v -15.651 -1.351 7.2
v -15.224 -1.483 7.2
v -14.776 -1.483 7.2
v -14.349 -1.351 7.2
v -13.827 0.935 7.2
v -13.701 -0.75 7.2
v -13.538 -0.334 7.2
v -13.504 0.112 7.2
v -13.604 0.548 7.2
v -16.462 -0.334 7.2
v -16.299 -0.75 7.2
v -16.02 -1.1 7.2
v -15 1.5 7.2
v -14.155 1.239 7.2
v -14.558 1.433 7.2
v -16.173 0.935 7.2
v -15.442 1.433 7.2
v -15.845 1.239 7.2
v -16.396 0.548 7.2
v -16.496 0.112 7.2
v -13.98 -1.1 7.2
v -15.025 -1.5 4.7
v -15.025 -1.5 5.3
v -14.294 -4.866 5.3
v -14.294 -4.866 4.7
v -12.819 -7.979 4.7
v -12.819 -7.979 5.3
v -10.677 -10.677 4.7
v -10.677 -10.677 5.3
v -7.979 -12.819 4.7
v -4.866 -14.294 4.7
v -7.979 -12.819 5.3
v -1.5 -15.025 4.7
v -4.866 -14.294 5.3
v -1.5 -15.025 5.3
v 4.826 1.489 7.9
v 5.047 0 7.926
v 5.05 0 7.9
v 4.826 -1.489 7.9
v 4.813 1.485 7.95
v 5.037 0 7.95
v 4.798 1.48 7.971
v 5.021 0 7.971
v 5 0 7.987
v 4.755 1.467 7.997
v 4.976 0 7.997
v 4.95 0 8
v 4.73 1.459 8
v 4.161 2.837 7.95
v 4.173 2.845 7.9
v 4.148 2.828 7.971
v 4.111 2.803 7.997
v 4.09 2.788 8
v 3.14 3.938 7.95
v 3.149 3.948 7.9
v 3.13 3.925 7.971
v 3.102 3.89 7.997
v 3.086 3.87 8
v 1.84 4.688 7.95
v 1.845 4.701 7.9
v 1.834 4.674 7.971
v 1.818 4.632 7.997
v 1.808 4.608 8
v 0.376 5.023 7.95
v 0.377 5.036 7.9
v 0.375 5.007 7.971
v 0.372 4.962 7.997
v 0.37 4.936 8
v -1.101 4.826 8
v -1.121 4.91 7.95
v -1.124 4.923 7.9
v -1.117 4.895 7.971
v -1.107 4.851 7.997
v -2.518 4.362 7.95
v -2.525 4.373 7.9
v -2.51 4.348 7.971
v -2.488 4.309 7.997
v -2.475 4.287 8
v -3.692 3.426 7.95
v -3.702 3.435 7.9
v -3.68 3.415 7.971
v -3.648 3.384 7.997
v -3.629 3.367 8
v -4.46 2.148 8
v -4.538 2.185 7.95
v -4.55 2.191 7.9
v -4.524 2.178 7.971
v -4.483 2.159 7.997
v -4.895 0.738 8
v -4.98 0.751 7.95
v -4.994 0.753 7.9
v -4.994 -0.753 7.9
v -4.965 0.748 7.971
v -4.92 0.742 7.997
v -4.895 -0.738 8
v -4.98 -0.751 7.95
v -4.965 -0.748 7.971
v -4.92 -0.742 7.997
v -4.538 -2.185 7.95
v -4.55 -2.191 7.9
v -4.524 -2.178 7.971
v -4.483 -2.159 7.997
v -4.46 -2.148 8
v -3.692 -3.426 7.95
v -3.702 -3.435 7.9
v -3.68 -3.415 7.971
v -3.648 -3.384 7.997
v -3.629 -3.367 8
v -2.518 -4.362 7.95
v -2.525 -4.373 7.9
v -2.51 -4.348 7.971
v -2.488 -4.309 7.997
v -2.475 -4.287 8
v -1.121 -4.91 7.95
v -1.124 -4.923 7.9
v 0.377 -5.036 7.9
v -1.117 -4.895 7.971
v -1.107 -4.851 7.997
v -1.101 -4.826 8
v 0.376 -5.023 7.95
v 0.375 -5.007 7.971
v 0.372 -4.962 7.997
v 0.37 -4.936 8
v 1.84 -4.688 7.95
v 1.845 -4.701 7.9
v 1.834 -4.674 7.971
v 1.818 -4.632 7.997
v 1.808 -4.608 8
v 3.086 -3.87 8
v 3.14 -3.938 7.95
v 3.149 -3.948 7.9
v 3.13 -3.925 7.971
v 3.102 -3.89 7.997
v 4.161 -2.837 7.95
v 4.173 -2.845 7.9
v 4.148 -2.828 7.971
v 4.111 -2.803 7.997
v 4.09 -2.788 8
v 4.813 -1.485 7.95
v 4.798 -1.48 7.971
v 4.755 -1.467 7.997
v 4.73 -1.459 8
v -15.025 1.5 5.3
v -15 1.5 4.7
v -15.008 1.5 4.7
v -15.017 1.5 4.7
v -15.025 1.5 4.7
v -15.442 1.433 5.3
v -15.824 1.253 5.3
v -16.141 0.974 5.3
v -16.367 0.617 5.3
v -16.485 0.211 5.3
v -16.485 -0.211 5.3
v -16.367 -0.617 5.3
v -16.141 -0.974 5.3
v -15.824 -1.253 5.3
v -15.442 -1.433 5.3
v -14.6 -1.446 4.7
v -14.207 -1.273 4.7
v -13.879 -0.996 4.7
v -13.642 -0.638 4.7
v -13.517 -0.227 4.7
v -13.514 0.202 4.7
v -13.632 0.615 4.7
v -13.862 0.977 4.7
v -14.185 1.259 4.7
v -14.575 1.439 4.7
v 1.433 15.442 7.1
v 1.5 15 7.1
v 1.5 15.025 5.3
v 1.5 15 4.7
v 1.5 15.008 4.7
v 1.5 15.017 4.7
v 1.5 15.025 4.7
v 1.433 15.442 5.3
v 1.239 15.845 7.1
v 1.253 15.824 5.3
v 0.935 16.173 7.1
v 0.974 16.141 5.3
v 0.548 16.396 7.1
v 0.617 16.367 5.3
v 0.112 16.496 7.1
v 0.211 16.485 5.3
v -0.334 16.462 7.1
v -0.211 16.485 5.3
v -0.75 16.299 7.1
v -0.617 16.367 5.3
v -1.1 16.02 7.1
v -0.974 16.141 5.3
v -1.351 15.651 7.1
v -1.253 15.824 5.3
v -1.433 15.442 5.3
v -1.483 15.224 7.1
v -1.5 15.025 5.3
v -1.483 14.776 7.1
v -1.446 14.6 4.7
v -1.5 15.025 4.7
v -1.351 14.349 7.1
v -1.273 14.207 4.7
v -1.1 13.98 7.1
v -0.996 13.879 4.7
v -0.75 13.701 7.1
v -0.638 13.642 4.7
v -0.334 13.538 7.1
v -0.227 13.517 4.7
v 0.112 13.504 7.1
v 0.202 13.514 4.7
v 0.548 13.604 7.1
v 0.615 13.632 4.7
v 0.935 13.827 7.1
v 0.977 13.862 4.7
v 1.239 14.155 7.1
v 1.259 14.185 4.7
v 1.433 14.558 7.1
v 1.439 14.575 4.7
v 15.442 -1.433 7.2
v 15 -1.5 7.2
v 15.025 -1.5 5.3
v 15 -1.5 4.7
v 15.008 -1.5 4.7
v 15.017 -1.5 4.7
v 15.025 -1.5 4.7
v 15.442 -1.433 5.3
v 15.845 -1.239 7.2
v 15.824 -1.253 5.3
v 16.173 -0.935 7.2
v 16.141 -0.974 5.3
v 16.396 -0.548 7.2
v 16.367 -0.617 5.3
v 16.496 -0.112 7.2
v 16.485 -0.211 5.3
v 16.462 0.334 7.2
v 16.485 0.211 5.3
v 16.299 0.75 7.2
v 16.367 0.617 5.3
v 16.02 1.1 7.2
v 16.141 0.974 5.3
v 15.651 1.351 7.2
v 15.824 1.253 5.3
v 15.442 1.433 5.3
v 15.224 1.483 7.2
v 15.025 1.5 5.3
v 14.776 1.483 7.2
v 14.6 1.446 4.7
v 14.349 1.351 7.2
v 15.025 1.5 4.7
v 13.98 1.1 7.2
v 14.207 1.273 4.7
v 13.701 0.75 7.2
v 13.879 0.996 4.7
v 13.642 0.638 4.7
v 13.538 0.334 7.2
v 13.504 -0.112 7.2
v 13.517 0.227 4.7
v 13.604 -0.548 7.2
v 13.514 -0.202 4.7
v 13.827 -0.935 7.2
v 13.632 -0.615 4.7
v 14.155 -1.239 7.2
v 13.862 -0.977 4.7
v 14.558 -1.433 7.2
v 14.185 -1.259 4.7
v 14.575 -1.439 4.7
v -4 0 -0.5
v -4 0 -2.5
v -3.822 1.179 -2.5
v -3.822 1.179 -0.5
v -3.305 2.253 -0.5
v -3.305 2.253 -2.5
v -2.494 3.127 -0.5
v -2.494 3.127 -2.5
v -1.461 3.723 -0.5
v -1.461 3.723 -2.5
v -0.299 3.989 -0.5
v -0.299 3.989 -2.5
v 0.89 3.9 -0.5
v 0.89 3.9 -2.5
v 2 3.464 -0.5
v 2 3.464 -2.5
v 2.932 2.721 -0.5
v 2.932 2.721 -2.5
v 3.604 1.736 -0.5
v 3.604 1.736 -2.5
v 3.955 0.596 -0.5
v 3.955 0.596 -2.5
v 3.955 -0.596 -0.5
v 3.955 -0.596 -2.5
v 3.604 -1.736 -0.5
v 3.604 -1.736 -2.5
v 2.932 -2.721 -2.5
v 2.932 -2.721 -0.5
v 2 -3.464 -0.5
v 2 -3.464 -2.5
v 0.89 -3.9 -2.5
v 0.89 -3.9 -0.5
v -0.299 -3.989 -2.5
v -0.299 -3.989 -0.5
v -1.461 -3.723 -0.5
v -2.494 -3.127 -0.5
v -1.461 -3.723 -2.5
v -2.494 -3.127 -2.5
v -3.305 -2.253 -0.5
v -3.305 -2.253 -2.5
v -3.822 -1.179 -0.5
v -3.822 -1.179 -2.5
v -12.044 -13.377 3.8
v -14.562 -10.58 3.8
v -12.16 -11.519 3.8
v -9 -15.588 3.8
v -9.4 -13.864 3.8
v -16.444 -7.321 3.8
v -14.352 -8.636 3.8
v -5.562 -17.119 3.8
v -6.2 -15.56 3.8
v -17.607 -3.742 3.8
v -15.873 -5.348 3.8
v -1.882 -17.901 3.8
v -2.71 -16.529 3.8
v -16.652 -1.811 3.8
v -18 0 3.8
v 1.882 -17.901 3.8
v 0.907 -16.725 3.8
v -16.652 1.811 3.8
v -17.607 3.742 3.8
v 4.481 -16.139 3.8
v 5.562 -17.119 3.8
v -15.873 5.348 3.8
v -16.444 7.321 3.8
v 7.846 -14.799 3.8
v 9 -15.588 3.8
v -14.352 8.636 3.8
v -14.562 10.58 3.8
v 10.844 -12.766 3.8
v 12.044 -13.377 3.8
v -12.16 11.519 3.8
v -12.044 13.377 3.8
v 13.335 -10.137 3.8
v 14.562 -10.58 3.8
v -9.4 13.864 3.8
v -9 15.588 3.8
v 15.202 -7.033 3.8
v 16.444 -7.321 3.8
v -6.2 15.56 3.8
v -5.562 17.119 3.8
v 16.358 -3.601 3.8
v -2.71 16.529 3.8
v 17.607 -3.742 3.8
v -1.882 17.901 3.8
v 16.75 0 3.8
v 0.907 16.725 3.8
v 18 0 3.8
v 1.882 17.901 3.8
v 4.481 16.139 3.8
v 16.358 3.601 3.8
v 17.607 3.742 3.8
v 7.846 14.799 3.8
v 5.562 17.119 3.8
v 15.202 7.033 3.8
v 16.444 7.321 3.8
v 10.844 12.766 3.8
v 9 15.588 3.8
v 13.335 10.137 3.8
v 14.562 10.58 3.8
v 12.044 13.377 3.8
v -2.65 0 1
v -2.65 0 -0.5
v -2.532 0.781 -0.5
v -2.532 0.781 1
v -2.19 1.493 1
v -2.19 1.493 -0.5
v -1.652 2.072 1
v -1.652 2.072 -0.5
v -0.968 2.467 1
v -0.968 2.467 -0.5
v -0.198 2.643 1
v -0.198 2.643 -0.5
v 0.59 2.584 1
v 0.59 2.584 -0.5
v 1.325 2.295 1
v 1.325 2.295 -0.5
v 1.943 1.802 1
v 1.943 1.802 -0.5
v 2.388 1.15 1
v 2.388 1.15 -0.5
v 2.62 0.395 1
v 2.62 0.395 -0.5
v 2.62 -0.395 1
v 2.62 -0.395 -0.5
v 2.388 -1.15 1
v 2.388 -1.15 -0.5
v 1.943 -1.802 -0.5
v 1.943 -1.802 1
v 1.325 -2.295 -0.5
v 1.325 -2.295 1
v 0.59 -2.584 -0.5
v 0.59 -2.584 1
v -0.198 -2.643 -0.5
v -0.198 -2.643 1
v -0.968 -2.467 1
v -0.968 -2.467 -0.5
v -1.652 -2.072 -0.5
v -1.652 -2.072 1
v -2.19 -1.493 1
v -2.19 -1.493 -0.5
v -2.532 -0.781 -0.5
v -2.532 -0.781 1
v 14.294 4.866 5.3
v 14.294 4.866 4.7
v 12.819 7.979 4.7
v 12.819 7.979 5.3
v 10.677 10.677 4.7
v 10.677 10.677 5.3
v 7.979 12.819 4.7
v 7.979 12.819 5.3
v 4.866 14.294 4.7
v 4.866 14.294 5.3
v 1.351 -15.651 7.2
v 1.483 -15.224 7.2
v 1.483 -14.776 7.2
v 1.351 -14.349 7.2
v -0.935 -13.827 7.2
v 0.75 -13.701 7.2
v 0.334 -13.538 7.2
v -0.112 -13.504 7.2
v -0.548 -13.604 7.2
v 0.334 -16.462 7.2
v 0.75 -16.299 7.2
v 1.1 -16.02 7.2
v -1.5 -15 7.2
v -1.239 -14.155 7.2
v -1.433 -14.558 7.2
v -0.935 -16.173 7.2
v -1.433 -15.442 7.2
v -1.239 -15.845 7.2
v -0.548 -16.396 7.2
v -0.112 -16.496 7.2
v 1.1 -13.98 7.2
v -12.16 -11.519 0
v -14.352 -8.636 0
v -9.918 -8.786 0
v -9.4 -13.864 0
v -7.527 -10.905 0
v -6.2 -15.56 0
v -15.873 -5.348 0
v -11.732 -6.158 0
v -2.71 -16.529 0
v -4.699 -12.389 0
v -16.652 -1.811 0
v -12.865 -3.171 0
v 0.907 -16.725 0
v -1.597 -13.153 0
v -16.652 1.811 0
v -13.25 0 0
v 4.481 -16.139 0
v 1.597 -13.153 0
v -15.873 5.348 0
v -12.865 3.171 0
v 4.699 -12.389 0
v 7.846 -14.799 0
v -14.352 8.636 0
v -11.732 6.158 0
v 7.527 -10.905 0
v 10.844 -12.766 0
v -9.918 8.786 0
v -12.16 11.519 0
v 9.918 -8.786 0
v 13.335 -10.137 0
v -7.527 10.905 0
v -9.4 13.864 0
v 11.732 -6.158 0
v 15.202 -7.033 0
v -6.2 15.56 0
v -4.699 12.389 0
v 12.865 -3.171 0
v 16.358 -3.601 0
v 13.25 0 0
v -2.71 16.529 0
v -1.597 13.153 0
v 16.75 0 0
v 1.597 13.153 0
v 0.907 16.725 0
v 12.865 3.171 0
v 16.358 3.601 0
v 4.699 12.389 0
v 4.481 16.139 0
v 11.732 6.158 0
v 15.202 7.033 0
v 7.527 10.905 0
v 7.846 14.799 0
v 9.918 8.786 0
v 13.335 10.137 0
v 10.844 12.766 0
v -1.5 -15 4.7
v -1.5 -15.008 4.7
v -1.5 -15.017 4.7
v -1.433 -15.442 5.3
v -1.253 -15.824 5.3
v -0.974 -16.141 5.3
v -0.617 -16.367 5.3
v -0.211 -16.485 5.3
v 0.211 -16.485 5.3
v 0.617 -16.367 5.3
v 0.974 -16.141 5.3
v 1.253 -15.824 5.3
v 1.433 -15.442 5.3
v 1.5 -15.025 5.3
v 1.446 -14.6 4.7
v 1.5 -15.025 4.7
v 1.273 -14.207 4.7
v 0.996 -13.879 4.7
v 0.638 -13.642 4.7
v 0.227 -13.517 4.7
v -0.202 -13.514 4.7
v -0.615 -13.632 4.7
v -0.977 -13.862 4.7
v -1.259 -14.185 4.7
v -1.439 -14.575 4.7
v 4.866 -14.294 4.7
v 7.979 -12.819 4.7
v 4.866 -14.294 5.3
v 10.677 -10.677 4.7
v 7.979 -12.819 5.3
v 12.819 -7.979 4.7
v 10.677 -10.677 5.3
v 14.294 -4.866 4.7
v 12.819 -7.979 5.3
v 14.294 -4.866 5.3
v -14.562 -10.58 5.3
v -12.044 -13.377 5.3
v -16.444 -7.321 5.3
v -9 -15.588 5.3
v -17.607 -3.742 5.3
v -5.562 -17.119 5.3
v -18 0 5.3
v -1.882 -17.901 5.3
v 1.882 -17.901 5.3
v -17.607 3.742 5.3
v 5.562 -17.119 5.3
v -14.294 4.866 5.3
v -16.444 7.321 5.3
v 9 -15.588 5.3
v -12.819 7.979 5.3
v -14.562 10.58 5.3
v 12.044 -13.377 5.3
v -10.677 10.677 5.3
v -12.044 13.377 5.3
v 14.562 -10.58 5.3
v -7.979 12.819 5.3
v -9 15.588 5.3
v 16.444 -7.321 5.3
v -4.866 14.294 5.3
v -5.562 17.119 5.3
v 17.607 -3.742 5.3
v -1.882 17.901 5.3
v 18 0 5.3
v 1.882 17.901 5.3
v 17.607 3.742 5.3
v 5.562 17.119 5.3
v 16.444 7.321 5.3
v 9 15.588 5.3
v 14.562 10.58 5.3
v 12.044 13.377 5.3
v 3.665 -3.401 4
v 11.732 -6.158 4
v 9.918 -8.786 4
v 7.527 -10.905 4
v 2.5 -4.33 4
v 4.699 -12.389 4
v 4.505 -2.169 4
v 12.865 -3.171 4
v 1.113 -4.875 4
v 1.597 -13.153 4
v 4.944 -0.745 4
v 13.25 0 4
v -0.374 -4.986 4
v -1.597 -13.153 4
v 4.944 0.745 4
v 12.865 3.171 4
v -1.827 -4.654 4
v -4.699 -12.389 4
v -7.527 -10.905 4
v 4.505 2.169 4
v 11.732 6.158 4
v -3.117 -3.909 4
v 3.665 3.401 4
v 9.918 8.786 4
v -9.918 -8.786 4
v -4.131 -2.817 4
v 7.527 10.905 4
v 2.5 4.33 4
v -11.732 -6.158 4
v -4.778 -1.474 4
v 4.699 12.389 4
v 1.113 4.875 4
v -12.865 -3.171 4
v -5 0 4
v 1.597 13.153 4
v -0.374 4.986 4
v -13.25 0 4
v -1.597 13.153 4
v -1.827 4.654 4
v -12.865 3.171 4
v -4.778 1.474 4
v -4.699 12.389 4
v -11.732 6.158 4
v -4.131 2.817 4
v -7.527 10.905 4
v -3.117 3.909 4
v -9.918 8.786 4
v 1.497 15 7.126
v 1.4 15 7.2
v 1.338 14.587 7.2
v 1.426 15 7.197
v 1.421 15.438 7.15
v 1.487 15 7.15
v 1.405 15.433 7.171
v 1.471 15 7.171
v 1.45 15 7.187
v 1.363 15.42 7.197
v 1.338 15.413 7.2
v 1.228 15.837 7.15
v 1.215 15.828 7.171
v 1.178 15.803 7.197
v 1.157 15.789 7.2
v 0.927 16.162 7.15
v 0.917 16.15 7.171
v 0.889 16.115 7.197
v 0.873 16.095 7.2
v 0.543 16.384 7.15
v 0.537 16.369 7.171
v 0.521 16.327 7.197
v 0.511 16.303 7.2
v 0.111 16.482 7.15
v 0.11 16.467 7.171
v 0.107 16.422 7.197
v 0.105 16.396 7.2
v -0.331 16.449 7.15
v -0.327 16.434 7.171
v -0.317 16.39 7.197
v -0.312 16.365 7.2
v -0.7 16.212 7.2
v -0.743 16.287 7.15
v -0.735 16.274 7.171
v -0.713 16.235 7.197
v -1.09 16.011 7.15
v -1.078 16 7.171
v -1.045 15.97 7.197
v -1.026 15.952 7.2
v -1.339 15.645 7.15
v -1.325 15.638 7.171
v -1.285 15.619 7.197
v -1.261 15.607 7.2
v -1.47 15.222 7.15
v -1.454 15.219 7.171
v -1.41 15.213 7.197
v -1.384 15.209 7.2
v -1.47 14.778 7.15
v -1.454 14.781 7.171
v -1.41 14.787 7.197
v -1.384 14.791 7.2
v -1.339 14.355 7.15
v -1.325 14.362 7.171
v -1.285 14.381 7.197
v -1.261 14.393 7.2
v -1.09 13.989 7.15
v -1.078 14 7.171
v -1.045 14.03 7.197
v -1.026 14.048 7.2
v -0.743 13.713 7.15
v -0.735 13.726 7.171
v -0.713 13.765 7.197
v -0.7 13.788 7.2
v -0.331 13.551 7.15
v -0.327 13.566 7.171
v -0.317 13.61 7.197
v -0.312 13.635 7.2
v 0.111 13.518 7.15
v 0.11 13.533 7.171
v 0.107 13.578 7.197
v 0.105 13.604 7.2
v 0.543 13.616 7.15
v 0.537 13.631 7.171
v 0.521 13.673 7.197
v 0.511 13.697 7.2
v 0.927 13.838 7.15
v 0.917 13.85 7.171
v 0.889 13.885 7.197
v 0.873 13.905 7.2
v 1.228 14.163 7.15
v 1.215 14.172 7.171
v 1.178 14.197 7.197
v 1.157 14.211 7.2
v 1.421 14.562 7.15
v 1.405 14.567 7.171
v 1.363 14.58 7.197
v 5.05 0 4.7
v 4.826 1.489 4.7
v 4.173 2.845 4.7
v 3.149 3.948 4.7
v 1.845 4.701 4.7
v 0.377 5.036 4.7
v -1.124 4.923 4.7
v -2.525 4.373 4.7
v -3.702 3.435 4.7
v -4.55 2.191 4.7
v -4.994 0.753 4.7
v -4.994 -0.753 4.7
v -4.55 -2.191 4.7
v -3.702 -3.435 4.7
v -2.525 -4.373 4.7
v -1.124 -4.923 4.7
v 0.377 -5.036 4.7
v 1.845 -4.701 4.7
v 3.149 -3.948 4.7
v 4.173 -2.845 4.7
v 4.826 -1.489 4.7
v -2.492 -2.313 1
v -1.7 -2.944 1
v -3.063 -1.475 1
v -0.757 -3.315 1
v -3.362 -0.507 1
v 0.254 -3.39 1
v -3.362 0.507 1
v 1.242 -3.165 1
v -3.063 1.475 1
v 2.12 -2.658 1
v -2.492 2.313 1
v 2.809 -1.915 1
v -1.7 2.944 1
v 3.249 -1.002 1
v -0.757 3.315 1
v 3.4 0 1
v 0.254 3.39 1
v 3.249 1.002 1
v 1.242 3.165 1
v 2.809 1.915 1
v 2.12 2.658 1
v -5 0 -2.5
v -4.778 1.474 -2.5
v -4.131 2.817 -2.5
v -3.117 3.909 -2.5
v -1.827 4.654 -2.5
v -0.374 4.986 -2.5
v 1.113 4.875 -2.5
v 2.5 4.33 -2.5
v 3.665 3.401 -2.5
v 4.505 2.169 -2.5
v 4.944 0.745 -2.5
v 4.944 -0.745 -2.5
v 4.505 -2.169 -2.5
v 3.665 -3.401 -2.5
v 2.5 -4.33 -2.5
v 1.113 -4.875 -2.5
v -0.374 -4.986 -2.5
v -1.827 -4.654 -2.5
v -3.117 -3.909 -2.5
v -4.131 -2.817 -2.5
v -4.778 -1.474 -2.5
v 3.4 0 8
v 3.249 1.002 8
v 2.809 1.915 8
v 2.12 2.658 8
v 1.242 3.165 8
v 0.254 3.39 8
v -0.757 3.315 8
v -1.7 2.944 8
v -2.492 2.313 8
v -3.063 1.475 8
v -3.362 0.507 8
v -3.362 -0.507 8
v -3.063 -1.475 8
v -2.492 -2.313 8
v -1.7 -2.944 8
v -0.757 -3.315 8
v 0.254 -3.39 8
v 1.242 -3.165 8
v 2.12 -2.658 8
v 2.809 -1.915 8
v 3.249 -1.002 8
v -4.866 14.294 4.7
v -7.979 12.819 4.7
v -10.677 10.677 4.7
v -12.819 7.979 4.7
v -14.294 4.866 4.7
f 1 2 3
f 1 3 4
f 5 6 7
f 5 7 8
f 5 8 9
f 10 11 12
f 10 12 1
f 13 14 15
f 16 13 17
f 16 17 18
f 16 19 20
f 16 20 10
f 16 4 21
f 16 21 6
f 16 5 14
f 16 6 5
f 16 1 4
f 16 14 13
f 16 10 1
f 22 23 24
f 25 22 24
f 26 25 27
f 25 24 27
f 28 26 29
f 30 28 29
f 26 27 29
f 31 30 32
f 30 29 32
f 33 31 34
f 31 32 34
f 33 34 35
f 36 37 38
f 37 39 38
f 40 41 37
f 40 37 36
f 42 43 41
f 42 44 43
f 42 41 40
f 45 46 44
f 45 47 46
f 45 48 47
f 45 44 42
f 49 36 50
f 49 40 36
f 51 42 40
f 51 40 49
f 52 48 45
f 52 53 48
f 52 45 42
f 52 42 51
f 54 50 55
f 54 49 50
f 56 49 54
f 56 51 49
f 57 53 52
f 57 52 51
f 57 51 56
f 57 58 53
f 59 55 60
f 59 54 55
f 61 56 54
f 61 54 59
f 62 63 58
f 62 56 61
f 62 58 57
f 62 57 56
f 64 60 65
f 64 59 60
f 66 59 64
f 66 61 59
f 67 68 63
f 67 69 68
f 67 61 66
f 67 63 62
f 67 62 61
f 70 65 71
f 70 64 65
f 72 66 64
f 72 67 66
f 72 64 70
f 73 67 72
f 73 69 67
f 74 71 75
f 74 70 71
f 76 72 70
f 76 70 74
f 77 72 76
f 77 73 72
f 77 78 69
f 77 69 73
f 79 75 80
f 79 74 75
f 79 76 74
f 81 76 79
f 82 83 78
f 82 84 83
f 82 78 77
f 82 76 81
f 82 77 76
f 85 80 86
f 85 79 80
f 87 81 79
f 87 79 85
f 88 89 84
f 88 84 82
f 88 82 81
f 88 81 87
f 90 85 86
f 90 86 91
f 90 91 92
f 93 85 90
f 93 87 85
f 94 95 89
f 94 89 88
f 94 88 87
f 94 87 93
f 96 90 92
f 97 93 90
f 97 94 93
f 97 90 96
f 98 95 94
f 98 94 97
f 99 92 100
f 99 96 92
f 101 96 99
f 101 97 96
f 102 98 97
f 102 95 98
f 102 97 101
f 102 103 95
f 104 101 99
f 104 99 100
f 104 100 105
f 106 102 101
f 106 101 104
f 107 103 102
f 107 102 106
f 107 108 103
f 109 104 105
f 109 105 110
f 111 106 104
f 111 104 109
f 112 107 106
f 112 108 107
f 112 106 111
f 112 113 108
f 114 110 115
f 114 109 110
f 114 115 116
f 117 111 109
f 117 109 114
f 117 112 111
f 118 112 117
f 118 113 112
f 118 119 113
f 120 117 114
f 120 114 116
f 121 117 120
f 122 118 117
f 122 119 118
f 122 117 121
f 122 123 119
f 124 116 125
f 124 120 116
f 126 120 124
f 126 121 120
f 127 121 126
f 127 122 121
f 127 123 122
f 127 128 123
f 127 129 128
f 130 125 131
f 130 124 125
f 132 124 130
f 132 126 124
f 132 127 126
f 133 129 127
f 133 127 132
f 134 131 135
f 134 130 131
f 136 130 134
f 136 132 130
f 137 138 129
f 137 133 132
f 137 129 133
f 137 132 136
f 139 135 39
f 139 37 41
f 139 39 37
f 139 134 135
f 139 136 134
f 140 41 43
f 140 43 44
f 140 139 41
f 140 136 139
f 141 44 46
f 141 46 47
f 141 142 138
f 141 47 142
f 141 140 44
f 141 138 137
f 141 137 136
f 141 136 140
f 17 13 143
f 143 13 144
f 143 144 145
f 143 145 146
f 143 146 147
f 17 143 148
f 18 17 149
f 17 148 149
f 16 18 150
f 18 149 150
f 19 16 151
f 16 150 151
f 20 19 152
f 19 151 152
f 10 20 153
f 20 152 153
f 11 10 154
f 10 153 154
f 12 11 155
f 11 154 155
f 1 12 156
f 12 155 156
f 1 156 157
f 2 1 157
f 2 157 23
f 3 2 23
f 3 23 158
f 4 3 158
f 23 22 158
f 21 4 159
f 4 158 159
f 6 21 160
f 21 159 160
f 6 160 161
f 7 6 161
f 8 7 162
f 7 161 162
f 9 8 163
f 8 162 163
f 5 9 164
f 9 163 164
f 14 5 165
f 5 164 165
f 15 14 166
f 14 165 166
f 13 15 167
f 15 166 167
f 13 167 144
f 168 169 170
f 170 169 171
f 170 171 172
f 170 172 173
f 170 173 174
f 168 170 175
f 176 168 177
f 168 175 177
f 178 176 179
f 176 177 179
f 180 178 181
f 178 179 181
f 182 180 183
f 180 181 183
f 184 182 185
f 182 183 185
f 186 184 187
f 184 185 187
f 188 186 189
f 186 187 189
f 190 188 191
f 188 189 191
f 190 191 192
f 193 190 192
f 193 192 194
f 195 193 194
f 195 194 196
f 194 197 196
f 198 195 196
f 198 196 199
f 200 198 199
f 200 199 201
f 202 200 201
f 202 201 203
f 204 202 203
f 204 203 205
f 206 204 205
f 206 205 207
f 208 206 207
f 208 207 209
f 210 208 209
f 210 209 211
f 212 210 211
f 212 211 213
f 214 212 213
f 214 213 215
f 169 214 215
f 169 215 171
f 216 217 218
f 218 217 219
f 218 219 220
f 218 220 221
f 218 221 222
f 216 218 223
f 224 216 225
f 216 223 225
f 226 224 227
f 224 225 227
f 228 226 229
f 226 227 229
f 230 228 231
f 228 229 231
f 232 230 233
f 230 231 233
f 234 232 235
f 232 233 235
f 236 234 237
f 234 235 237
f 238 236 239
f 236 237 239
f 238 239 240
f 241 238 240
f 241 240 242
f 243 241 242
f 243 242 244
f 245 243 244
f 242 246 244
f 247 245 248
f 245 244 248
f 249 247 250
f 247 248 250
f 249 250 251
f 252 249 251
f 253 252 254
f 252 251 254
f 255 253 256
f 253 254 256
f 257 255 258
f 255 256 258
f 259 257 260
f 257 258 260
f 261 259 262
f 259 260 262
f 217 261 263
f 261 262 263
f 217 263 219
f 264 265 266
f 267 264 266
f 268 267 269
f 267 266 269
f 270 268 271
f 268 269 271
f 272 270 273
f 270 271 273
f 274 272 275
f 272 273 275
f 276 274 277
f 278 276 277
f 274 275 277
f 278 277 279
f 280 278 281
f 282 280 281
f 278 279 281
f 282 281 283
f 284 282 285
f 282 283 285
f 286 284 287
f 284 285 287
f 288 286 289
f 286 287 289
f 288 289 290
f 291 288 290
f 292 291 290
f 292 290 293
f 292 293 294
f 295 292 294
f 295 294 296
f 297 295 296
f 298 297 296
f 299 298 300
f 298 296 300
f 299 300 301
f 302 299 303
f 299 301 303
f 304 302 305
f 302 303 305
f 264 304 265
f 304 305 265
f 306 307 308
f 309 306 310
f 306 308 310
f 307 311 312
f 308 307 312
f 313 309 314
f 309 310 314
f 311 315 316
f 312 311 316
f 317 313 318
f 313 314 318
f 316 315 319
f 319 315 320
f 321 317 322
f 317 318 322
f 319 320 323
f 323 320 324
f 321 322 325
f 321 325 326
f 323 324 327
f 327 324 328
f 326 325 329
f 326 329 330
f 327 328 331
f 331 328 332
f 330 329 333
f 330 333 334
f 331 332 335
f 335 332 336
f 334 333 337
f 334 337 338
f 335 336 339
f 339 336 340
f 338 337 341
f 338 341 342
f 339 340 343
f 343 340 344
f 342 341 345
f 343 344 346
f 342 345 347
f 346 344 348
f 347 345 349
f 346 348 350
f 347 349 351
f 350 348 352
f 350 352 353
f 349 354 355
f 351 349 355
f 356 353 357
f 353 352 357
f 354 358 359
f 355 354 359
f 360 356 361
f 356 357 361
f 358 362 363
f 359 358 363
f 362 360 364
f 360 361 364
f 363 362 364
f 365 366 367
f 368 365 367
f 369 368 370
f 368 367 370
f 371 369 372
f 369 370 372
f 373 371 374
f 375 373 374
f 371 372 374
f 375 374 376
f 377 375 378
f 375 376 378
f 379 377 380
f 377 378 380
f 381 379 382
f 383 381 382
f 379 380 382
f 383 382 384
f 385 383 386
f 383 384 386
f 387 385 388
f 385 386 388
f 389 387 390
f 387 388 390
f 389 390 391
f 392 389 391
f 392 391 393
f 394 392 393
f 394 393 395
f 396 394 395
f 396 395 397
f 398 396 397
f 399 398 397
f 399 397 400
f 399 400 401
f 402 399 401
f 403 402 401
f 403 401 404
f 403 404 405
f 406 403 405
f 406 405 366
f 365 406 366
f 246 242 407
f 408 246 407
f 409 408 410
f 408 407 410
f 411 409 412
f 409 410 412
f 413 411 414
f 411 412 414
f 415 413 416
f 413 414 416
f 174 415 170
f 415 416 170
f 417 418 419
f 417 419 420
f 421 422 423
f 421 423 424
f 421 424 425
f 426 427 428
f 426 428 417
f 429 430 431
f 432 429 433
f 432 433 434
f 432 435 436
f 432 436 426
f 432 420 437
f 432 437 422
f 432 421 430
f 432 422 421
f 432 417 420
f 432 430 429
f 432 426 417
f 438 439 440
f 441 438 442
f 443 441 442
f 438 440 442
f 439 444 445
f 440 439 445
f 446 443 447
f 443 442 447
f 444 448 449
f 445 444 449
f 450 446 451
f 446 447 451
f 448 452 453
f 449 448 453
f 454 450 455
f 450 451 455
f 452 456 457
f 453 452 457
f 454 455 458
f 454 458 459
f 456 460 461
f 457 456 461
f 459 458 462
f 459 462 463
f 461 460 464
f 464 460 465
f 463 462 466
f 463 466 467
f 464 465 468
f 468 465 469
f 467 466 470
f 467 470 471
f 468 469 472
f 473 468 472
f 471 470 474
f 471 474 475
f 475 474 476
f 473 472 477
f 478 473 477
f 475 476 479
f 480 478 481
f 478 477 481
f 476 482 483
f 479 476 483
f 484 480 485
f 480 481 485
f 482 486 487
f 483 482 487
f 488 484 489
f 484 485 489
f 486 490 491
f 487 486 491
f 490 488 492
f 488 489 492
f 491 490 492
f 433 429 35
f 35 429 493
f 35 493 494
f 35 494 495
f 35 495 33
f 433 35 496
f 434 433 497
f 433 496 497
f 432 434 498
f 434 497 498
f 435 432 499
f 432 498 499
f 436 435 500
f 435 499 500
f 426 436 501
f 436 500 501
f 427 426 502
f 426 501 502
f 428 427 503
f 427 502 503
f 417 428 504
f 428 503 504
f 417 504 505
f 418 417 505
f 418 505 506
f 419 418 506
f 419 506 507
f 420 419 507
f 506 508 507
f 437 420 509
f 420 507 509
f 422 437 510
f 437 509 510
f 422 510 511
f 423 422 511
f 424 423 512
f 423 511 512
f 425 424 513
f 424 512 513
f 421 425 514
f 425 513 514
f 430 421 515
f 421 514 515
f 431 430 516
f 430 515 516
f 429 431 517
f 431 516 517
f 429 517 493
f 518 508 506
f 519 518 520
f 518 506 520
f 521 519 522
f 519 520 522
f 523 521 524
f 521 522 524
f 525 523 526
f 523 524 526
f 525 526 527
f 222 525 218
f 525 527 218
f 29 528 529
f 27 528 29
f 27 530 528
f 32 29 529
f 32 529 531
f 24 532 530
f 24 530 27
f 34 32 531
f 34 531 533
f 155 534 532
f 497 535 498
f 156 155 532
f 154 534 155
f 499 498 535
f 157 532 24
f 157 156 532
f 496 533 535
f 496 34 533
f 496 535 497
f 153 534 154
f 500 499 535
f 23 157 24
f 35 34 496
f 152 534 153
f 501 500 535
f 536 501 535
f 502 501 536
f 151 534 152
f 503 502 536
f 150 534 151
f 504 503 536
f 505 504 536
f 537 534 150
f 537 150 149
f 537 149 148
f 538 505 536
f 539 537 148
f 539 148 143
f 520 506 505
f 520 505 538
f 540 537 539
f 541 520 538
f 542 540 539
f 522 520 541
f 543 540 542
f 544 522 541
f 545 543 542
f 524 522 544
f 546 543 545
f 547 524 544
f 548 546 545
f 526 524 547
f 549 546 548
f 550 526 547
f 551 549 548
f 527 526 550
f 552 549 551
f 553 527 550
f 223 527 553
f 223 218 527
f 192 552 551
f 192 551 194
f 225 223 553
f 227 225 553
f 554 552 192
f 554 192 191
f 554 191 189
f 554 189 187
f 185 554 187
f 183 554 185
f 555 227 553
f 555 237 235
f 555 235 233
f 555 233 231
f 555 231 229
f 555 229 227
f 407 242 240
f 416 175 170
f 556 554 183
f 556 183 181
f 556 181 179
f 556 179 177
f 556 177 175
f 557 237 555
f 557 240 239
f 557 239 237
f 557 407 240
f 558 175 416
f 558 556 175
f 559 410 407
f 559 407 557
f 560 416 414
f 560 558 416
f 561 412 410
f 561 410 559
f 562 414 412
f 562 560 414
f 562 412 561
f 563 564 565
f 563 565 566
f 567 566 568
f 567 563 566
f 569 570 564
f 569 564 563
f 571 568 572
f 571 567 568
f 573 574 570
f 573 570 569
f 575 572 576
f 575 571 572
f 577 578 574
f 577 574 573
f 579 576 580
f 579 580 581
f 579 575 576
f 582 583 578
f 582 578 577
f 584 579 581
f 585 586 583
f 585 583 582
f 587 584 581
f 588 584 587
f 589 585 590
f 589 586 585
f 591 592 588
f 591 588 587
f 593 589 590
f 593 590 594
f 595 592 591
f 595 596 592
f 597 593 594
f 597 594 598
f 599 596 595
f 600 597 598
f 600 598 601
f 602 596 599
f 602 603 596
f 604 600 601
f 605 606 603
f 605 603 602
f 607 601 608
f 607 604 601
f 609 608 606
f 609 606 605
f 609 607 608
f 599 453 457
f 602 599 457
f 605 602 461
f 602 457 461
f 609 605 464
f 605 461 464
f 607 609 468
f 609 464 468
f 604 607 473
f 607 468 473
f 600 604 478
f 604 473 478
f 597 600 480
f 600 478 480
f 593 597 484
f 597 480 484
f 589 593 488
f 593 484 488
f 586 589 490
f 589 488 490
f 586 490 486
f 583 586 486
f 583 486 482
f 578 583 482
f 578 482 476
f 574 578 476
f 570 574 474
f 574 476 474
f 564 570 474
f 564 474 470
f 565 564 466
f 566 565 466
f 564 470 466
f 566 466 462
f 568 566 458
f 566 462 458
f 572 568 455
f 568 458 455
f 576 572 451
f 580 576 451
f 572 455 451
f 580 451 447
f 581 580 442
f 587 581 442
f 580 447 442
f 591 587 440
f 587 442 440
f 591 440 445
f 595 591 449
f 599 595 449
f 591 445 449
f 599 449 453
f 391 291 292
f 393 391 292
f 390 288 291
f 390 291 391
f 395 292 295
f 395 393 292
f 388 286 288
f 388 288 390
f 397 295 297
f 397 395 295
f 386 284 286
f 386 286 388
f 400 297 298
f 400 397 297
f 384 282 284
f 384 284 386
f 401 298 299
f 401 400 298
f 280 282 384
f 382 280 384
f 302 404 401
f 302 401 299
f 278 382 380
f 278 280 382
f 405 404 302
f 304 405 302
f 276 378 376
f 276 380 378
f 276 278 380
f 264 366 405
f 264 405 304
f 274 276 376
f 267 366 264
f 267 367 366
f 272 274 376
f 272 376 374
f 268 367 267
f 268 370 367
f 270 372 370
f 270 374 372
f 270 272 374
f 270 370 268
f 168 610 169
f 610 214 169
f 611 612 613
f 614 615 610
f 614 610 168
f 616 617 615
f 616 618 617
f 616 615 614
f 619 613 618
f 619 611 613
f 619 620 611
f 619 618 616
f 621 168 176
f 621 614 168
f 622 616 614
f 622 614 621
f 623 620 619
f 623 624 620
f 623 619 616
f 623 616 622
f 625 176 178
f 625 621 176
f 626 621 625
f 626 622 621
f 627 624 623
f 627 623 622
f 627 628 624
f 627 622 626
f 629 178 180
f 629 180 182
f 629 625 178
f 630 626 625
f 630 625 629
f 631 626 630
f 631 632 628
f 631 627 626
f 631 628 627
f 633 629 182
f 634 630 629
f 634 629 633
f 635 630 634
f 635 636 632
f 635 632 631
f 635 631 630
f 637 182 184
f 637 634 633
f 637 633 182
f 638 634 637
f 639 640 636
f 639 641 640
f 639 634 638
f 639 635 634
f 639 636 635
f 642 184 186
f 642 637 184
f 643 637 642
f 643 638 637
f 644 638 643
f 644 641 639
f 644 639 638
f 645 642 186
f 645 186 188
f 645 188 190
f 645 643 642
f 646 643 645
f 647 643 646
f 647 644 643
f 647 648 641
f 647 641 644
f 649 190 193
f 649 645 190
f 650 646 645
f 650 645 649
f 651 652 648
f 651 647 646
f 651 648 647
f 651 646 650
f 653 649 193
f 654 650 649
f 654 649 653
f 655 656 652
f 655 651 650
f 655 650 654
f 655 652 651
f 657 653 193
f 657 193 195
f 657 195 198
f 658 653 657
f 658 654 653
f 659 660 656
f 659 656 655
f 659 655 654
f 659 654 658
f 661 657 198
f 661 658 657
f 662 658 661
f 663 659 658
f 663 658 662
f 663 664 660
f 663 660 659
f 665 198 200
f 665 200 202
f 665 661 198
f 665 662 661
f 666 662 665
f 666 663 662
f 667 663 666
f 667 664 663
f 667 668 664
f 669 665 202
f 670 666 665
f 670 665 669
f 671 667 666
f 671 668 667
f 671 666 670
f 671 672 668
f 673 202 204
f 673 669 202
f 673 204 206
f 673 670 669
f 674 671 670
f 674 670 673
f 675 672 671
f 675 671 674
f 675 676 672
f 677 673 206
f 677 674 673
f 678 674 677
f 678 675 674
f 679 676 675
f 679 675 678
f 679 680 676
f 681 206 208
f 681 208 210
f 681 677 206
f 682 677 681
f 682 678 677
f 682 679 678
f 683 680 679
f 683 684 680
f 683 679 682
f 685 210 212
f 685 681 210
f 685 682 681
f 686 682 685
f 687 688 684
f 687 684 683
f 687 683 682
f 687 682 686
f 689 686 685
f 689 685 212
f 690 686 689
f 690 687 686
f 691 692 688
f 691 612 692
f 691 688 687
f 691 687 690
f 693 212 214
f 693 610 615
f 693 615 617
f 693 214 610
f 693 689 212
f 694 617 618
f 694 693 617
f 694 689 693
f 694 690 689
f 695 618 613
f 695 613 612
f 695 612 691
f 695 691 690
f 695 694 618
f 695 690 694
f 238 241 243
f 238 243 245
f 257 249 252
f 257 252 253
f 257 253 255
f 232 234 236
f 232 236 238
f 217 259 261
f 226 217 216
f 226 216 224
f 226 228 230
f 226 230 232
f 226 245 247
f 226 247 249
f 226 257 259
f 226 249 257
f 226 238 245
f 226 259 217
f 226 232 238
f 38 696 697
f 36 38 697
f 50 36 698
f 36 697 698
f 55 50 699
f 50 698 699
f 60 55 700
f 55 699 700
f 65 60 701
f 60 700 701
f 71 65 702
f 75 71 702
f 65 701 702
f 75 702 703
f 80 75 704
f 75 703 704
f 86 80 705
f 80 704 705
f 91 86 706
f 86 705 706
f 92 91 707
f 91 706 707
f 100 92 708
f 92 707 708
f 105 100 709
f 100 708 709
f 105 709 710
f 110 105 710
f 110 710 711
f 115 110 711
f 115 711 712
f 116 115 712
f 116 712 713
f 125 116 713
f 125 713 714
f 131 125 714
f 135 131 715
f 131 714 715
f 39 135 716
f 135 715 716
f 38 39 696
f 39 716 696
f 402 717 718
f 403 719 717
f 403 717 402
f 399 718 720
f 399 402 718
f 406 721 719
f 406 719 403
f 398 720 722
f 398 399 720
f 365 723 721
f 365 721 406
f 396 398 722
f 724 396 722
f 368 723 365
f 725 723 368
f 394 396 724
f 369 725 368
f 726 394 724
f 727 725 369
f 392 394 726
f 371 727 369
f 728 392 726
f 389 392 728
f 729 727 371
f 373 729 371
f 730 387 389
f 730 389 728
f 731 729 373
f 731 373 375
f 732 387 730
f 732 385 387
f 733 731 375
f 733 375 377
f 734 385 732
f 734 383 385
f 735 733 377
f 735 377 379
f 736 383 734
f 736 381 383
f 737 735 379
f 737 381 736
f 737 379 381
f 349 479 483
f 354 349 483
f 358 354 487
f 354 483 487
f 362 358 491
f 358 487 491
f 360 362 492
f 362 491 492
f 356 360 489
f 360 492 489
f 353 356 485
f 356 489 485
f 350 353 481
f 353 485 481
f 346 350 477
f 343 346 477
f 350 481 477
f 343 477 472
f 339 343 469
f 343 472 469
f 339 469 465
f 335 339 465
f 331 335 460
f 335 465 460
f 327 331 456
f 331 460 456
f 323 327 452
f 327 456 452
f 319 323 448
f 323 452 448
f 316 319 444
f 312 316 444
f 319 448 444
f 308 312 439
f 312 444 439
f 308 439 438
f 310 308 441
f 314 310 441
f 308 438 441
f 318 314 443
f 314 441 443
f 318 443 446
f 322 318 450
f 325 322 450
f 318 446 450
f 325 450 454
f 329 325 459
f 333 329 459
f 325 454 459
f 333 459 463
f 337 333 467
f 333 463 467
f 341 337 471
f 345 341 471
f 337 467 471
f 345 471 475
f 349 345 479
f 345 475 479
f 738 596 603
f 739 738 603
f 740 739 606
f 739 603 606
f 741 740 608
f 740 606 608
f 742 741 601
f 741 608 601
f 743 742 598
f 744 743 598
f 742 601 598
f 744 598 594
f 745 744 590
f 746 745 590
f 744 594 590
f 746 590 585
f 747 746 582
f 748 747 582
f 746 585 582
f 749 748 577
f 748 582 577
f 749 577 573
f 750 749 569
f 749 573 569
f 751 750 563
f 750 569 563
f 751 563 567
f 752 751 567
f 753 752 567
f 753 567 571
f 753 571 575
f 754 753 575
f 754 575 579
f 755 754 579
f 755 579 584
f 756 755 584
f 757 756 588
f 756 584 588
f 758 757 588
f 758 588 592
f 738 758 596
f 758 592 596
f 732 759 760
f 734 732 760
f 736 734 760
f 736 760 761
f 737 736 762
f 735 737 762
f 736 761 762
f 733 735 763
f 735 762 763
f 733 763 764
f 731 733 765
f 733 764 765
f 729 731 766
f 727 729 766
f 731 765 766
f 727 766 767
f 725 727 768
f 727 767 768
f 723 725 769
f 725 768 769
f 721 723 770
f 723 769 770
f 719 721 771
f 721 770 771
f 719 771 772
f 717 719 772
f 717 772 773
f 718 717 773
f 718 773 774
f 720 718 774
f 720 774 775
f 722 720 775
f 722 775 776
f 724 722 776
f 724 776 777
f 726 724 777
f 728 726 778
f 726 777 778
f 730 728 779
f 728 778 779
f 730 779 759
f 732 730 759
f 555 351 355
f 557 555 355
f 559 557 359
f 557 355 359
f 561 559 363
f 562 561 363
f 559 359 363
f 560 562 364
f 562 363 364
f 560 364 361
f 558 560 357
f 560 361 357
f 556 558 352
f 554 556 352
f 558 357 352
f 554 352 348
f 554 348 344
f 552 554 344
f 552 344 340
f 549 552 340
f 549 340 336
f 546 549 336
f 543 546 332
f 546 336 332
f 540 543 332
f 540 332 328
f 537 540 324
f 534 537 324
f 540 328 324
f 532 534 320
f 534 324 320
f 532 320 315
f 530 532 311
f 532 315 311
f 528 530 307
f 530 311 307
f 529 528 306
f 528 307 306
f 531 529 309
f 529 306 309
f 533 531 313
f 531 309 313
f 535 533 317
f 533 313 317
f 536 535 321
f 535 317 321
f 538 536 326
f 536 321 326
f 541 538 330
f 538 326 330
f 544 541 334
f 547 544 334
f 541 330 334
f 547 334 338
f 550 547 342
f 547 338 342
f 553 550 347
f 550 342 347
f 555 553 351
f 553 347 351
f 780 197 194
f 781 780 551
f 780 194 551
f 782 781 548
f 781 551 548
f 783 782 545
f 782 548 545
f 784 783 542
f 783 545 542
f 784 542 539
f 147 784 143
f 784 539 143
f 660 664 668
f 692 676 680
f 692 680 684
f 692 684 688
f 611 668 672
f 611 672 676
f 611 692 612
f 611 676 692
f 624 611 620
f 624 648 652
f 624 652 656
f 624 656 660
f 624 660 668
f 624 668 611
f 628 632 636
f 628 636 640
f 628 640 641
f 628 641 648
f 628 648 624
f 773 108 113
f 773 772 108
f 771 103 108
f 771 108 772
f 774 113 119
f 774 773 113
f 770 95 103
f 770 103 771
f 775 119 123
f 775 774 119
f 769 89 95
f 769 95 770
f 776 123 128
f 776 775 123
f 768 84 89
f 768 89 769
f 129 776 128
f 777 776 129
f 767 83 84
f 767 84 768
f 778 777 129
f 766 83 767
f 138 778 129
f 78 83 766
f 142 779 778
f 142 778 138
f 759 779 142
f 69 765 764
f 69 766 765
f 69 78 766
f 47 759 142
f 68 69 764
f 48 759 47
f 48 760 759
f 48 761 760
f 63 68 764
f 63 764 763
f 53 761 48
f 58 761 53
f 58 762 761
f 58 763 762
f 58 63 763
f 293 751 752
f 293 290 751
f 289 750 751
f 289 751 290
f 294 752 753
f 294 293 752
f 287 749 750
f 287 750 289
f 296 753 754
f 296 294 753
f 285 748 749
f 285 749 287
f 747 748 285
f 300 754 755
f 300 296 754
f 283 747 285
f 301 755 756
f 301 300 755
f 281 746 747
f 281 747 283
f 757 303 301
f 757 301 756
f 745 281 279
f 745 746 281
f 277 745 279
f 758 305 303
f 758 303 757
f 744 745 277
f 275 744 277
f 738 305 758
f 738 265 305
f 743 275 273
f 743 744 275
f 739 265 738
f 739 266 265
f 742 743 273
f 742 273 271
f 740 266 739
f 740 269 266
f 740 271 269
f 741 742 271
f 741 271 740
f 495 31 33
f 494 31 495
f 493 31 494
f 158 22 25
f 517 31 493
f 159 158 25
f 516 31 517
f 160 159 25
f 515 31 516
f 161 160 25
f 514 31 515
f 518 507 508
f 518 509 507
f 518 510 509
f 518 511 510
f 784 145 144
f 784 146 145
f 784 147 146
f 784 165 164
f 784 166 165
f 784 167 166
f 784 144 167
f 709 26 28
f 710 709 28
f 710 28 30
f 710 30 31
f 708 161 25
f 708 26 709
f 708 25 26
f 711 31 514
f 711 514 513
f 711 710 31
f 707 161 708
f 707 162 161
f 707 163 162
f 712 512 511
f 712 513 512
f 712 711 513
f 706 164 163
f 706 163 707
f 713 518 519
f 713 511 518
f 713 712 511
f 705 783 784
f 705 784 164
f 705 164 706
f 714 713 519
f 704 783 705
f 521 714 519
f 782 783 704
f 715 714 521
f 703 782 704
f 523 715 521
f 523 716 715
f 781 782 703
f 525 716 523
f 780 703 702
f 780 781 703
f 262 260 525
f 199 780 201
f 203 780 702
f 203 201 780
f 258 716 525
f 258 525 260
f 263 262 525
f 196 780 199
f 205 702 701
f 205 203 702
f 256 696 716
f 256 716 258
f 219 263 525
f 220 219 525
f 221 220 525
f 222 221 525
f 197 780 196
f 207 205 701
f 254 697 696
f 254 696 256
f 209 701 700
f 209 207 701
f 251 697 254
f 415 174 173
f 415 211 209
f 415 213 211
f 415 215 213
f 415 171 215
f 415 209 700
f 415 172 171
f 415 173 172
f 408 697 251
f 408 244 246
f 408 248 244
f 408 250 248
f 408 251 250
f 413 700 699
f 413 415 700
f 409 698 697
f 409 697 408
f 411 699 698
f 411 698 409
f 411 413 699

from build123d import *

# Parameters (mm, degrees)
SKETCH1_R           = 16.75
BOSS_EXTRUDE1_DEPTH = 3.8
SKETCH2_R           = 18
BOSS_EXTRUDE2_DEPTH = 1.5
SKETCH3_R           = 13.25
CUT_EXTRUDE1_DEPTH  = 4
SKETCH4_R           = 5
BOSS_EXTRUDE3_DEPTH = 6.5
SKETCH5_R           = 4
CUT_EXTRUDE2_DEPTH  = 2
SKETCH7_R           = 15.1
CUT_EXTRUDE3_DEPTH  = 0.6
SKETCH8_R           = 5.05
BOSS_EXTRUDE4_DEPTH = 3.3
SKETCH6_R           = 2.65
CUT_EXTRUDE4_DEPTH  = 9.5
SKETCH9_R           = 3.4
CUT_EXTRUDE5_DEPTH  = 7
SKETCH10_R          = 1.5
BOSS_EXTRUDE5_DEPTH = 2.5
FILLET2_R           = 0.1
FILLET3_R           = 0.1
CIRPATTERN1_COUNT   = 4


with BuildPart() as part:
    # Sketch1 → Boss-Extrude1 (new body)
    with BuildSketch(Plane.XY):
        Circle(SKETCH1_R)
    extrude(amount=BOSS_EXTRUDE1_DEPTH)

    # Sketch2 → Boss-Extrude2 (add)
    with BuildSketch(Plane.XY.offset(3.8)):
        Circle(SKETCH2_R)
    extrude(amount=BOSS_EXTRUDE2_DEPTH)

    # Sketch3 → Cut-Extrude1 (cut)
    with BuildSketch(Plane(origin=(0, 0, 0), x_dir=(-1, 0, 0), z_dir=(0, 0, -1))):
        Circle(SKETCH3_R)
    extrude(amount=-CUT_EXTRUDE1_DEPTH, mode=Mode.SUBTRACT)

    # Sketch4 → Boss-Extrude3 (add)
    with BuildSketch(Plane(origin=(0, 0, 4), x_dir=(-1, 0, 0), z_dir=(0, 0, -1))):
        Circle(SKETCH4_R)
    extrude(amount=BOSS_EXTRUDE3_DEPTH)

    # Sketch5 → Cut-Extrude2 (cut)
    with BuildSketch(Plane(origin=(0, 0, -2.5), x_dir=(-1, 0, 0), z_dir=(0, 0, -1))):
        Circle(SKETCH5_R)
    extrude(amount=-CUT_EXTRUDE2_DEPTH, mode=Mode.SUBTRACT)

    # Sketch7 → Cut-Extrude3 (cut)
    with BuildSketch(Plane.XY.offset(5.3)):
        Circle(SKETCH7_R)
    extrude(amount=-CUT_EXTRUDE3_DEPTH, mode=Mode.SUBTRACT)

    # Sketch8 → Boss-Extrude4 (add)
    with BuildSketch(Plane.XY.offset(4.7)):
        Circle(SKETCH8_R)
    extrude(amount=BOSS_EXTRUDE4_DEPTH)

    # Sketch6 → Cut-Extrude4 (cut, through all)
    with BuildSketch(Plane(origin=(0, 0, -0.5), x_dir=(-1, 0, 0), z_dir=(0, 0, -1))):
        Circle(SKETCH6_R)
    extrude(amount=-CUT_EXTRUDE4_DEPTH, mode=Mode.SUBTRACT)

    # Sketch9 → Cut-Extrude5 (cut)
    with BuildSketch(Plane.XY.offset(8)):
        Circle(SKETCH9_R)
    extrude(amount=-CUT_EXTRUDE5_DEPTH, mode=Mode.SUBTRACT)

    # Sketch10 → Boss-Extrude5 (add)
    with BuildSketch(Plane.XY.offset(4.7)):
        with Locations((0, 15)):
            Circle(SKETCH10_R)
    boss_extrude5 = extrude(amount=BOSS_EXTRUDE5_DEPTH)

    # Fillet2
    fillet2_edges = [part.edges().sort_by_distance(p)[0] for p in [
        (-1.5, 15, 7.2),
    ]]
    fillet(fillet2_edges, radius=FILLET2_R)

    # Fillet3
    fillet3_edges = [part.edges().sort_by_distance(p)[0] for p in [
        (-5.05, 0, 8),
    ]]
    fillet(fillet3_edges, radius=FILLET3_R)

    # CirPattern1: Boss-Extrude5 ×4 about axis
    cirpattern1_axis = Axis((0, 0, 0), (0, 0, 1))
    for i in range(1, CIRPATTERN1_COUNT):
        add(boss_extrude5.rotate(cirpattern1_axis, i * 360 / CIRPATTERN1_COUNT))


solid = part.part
